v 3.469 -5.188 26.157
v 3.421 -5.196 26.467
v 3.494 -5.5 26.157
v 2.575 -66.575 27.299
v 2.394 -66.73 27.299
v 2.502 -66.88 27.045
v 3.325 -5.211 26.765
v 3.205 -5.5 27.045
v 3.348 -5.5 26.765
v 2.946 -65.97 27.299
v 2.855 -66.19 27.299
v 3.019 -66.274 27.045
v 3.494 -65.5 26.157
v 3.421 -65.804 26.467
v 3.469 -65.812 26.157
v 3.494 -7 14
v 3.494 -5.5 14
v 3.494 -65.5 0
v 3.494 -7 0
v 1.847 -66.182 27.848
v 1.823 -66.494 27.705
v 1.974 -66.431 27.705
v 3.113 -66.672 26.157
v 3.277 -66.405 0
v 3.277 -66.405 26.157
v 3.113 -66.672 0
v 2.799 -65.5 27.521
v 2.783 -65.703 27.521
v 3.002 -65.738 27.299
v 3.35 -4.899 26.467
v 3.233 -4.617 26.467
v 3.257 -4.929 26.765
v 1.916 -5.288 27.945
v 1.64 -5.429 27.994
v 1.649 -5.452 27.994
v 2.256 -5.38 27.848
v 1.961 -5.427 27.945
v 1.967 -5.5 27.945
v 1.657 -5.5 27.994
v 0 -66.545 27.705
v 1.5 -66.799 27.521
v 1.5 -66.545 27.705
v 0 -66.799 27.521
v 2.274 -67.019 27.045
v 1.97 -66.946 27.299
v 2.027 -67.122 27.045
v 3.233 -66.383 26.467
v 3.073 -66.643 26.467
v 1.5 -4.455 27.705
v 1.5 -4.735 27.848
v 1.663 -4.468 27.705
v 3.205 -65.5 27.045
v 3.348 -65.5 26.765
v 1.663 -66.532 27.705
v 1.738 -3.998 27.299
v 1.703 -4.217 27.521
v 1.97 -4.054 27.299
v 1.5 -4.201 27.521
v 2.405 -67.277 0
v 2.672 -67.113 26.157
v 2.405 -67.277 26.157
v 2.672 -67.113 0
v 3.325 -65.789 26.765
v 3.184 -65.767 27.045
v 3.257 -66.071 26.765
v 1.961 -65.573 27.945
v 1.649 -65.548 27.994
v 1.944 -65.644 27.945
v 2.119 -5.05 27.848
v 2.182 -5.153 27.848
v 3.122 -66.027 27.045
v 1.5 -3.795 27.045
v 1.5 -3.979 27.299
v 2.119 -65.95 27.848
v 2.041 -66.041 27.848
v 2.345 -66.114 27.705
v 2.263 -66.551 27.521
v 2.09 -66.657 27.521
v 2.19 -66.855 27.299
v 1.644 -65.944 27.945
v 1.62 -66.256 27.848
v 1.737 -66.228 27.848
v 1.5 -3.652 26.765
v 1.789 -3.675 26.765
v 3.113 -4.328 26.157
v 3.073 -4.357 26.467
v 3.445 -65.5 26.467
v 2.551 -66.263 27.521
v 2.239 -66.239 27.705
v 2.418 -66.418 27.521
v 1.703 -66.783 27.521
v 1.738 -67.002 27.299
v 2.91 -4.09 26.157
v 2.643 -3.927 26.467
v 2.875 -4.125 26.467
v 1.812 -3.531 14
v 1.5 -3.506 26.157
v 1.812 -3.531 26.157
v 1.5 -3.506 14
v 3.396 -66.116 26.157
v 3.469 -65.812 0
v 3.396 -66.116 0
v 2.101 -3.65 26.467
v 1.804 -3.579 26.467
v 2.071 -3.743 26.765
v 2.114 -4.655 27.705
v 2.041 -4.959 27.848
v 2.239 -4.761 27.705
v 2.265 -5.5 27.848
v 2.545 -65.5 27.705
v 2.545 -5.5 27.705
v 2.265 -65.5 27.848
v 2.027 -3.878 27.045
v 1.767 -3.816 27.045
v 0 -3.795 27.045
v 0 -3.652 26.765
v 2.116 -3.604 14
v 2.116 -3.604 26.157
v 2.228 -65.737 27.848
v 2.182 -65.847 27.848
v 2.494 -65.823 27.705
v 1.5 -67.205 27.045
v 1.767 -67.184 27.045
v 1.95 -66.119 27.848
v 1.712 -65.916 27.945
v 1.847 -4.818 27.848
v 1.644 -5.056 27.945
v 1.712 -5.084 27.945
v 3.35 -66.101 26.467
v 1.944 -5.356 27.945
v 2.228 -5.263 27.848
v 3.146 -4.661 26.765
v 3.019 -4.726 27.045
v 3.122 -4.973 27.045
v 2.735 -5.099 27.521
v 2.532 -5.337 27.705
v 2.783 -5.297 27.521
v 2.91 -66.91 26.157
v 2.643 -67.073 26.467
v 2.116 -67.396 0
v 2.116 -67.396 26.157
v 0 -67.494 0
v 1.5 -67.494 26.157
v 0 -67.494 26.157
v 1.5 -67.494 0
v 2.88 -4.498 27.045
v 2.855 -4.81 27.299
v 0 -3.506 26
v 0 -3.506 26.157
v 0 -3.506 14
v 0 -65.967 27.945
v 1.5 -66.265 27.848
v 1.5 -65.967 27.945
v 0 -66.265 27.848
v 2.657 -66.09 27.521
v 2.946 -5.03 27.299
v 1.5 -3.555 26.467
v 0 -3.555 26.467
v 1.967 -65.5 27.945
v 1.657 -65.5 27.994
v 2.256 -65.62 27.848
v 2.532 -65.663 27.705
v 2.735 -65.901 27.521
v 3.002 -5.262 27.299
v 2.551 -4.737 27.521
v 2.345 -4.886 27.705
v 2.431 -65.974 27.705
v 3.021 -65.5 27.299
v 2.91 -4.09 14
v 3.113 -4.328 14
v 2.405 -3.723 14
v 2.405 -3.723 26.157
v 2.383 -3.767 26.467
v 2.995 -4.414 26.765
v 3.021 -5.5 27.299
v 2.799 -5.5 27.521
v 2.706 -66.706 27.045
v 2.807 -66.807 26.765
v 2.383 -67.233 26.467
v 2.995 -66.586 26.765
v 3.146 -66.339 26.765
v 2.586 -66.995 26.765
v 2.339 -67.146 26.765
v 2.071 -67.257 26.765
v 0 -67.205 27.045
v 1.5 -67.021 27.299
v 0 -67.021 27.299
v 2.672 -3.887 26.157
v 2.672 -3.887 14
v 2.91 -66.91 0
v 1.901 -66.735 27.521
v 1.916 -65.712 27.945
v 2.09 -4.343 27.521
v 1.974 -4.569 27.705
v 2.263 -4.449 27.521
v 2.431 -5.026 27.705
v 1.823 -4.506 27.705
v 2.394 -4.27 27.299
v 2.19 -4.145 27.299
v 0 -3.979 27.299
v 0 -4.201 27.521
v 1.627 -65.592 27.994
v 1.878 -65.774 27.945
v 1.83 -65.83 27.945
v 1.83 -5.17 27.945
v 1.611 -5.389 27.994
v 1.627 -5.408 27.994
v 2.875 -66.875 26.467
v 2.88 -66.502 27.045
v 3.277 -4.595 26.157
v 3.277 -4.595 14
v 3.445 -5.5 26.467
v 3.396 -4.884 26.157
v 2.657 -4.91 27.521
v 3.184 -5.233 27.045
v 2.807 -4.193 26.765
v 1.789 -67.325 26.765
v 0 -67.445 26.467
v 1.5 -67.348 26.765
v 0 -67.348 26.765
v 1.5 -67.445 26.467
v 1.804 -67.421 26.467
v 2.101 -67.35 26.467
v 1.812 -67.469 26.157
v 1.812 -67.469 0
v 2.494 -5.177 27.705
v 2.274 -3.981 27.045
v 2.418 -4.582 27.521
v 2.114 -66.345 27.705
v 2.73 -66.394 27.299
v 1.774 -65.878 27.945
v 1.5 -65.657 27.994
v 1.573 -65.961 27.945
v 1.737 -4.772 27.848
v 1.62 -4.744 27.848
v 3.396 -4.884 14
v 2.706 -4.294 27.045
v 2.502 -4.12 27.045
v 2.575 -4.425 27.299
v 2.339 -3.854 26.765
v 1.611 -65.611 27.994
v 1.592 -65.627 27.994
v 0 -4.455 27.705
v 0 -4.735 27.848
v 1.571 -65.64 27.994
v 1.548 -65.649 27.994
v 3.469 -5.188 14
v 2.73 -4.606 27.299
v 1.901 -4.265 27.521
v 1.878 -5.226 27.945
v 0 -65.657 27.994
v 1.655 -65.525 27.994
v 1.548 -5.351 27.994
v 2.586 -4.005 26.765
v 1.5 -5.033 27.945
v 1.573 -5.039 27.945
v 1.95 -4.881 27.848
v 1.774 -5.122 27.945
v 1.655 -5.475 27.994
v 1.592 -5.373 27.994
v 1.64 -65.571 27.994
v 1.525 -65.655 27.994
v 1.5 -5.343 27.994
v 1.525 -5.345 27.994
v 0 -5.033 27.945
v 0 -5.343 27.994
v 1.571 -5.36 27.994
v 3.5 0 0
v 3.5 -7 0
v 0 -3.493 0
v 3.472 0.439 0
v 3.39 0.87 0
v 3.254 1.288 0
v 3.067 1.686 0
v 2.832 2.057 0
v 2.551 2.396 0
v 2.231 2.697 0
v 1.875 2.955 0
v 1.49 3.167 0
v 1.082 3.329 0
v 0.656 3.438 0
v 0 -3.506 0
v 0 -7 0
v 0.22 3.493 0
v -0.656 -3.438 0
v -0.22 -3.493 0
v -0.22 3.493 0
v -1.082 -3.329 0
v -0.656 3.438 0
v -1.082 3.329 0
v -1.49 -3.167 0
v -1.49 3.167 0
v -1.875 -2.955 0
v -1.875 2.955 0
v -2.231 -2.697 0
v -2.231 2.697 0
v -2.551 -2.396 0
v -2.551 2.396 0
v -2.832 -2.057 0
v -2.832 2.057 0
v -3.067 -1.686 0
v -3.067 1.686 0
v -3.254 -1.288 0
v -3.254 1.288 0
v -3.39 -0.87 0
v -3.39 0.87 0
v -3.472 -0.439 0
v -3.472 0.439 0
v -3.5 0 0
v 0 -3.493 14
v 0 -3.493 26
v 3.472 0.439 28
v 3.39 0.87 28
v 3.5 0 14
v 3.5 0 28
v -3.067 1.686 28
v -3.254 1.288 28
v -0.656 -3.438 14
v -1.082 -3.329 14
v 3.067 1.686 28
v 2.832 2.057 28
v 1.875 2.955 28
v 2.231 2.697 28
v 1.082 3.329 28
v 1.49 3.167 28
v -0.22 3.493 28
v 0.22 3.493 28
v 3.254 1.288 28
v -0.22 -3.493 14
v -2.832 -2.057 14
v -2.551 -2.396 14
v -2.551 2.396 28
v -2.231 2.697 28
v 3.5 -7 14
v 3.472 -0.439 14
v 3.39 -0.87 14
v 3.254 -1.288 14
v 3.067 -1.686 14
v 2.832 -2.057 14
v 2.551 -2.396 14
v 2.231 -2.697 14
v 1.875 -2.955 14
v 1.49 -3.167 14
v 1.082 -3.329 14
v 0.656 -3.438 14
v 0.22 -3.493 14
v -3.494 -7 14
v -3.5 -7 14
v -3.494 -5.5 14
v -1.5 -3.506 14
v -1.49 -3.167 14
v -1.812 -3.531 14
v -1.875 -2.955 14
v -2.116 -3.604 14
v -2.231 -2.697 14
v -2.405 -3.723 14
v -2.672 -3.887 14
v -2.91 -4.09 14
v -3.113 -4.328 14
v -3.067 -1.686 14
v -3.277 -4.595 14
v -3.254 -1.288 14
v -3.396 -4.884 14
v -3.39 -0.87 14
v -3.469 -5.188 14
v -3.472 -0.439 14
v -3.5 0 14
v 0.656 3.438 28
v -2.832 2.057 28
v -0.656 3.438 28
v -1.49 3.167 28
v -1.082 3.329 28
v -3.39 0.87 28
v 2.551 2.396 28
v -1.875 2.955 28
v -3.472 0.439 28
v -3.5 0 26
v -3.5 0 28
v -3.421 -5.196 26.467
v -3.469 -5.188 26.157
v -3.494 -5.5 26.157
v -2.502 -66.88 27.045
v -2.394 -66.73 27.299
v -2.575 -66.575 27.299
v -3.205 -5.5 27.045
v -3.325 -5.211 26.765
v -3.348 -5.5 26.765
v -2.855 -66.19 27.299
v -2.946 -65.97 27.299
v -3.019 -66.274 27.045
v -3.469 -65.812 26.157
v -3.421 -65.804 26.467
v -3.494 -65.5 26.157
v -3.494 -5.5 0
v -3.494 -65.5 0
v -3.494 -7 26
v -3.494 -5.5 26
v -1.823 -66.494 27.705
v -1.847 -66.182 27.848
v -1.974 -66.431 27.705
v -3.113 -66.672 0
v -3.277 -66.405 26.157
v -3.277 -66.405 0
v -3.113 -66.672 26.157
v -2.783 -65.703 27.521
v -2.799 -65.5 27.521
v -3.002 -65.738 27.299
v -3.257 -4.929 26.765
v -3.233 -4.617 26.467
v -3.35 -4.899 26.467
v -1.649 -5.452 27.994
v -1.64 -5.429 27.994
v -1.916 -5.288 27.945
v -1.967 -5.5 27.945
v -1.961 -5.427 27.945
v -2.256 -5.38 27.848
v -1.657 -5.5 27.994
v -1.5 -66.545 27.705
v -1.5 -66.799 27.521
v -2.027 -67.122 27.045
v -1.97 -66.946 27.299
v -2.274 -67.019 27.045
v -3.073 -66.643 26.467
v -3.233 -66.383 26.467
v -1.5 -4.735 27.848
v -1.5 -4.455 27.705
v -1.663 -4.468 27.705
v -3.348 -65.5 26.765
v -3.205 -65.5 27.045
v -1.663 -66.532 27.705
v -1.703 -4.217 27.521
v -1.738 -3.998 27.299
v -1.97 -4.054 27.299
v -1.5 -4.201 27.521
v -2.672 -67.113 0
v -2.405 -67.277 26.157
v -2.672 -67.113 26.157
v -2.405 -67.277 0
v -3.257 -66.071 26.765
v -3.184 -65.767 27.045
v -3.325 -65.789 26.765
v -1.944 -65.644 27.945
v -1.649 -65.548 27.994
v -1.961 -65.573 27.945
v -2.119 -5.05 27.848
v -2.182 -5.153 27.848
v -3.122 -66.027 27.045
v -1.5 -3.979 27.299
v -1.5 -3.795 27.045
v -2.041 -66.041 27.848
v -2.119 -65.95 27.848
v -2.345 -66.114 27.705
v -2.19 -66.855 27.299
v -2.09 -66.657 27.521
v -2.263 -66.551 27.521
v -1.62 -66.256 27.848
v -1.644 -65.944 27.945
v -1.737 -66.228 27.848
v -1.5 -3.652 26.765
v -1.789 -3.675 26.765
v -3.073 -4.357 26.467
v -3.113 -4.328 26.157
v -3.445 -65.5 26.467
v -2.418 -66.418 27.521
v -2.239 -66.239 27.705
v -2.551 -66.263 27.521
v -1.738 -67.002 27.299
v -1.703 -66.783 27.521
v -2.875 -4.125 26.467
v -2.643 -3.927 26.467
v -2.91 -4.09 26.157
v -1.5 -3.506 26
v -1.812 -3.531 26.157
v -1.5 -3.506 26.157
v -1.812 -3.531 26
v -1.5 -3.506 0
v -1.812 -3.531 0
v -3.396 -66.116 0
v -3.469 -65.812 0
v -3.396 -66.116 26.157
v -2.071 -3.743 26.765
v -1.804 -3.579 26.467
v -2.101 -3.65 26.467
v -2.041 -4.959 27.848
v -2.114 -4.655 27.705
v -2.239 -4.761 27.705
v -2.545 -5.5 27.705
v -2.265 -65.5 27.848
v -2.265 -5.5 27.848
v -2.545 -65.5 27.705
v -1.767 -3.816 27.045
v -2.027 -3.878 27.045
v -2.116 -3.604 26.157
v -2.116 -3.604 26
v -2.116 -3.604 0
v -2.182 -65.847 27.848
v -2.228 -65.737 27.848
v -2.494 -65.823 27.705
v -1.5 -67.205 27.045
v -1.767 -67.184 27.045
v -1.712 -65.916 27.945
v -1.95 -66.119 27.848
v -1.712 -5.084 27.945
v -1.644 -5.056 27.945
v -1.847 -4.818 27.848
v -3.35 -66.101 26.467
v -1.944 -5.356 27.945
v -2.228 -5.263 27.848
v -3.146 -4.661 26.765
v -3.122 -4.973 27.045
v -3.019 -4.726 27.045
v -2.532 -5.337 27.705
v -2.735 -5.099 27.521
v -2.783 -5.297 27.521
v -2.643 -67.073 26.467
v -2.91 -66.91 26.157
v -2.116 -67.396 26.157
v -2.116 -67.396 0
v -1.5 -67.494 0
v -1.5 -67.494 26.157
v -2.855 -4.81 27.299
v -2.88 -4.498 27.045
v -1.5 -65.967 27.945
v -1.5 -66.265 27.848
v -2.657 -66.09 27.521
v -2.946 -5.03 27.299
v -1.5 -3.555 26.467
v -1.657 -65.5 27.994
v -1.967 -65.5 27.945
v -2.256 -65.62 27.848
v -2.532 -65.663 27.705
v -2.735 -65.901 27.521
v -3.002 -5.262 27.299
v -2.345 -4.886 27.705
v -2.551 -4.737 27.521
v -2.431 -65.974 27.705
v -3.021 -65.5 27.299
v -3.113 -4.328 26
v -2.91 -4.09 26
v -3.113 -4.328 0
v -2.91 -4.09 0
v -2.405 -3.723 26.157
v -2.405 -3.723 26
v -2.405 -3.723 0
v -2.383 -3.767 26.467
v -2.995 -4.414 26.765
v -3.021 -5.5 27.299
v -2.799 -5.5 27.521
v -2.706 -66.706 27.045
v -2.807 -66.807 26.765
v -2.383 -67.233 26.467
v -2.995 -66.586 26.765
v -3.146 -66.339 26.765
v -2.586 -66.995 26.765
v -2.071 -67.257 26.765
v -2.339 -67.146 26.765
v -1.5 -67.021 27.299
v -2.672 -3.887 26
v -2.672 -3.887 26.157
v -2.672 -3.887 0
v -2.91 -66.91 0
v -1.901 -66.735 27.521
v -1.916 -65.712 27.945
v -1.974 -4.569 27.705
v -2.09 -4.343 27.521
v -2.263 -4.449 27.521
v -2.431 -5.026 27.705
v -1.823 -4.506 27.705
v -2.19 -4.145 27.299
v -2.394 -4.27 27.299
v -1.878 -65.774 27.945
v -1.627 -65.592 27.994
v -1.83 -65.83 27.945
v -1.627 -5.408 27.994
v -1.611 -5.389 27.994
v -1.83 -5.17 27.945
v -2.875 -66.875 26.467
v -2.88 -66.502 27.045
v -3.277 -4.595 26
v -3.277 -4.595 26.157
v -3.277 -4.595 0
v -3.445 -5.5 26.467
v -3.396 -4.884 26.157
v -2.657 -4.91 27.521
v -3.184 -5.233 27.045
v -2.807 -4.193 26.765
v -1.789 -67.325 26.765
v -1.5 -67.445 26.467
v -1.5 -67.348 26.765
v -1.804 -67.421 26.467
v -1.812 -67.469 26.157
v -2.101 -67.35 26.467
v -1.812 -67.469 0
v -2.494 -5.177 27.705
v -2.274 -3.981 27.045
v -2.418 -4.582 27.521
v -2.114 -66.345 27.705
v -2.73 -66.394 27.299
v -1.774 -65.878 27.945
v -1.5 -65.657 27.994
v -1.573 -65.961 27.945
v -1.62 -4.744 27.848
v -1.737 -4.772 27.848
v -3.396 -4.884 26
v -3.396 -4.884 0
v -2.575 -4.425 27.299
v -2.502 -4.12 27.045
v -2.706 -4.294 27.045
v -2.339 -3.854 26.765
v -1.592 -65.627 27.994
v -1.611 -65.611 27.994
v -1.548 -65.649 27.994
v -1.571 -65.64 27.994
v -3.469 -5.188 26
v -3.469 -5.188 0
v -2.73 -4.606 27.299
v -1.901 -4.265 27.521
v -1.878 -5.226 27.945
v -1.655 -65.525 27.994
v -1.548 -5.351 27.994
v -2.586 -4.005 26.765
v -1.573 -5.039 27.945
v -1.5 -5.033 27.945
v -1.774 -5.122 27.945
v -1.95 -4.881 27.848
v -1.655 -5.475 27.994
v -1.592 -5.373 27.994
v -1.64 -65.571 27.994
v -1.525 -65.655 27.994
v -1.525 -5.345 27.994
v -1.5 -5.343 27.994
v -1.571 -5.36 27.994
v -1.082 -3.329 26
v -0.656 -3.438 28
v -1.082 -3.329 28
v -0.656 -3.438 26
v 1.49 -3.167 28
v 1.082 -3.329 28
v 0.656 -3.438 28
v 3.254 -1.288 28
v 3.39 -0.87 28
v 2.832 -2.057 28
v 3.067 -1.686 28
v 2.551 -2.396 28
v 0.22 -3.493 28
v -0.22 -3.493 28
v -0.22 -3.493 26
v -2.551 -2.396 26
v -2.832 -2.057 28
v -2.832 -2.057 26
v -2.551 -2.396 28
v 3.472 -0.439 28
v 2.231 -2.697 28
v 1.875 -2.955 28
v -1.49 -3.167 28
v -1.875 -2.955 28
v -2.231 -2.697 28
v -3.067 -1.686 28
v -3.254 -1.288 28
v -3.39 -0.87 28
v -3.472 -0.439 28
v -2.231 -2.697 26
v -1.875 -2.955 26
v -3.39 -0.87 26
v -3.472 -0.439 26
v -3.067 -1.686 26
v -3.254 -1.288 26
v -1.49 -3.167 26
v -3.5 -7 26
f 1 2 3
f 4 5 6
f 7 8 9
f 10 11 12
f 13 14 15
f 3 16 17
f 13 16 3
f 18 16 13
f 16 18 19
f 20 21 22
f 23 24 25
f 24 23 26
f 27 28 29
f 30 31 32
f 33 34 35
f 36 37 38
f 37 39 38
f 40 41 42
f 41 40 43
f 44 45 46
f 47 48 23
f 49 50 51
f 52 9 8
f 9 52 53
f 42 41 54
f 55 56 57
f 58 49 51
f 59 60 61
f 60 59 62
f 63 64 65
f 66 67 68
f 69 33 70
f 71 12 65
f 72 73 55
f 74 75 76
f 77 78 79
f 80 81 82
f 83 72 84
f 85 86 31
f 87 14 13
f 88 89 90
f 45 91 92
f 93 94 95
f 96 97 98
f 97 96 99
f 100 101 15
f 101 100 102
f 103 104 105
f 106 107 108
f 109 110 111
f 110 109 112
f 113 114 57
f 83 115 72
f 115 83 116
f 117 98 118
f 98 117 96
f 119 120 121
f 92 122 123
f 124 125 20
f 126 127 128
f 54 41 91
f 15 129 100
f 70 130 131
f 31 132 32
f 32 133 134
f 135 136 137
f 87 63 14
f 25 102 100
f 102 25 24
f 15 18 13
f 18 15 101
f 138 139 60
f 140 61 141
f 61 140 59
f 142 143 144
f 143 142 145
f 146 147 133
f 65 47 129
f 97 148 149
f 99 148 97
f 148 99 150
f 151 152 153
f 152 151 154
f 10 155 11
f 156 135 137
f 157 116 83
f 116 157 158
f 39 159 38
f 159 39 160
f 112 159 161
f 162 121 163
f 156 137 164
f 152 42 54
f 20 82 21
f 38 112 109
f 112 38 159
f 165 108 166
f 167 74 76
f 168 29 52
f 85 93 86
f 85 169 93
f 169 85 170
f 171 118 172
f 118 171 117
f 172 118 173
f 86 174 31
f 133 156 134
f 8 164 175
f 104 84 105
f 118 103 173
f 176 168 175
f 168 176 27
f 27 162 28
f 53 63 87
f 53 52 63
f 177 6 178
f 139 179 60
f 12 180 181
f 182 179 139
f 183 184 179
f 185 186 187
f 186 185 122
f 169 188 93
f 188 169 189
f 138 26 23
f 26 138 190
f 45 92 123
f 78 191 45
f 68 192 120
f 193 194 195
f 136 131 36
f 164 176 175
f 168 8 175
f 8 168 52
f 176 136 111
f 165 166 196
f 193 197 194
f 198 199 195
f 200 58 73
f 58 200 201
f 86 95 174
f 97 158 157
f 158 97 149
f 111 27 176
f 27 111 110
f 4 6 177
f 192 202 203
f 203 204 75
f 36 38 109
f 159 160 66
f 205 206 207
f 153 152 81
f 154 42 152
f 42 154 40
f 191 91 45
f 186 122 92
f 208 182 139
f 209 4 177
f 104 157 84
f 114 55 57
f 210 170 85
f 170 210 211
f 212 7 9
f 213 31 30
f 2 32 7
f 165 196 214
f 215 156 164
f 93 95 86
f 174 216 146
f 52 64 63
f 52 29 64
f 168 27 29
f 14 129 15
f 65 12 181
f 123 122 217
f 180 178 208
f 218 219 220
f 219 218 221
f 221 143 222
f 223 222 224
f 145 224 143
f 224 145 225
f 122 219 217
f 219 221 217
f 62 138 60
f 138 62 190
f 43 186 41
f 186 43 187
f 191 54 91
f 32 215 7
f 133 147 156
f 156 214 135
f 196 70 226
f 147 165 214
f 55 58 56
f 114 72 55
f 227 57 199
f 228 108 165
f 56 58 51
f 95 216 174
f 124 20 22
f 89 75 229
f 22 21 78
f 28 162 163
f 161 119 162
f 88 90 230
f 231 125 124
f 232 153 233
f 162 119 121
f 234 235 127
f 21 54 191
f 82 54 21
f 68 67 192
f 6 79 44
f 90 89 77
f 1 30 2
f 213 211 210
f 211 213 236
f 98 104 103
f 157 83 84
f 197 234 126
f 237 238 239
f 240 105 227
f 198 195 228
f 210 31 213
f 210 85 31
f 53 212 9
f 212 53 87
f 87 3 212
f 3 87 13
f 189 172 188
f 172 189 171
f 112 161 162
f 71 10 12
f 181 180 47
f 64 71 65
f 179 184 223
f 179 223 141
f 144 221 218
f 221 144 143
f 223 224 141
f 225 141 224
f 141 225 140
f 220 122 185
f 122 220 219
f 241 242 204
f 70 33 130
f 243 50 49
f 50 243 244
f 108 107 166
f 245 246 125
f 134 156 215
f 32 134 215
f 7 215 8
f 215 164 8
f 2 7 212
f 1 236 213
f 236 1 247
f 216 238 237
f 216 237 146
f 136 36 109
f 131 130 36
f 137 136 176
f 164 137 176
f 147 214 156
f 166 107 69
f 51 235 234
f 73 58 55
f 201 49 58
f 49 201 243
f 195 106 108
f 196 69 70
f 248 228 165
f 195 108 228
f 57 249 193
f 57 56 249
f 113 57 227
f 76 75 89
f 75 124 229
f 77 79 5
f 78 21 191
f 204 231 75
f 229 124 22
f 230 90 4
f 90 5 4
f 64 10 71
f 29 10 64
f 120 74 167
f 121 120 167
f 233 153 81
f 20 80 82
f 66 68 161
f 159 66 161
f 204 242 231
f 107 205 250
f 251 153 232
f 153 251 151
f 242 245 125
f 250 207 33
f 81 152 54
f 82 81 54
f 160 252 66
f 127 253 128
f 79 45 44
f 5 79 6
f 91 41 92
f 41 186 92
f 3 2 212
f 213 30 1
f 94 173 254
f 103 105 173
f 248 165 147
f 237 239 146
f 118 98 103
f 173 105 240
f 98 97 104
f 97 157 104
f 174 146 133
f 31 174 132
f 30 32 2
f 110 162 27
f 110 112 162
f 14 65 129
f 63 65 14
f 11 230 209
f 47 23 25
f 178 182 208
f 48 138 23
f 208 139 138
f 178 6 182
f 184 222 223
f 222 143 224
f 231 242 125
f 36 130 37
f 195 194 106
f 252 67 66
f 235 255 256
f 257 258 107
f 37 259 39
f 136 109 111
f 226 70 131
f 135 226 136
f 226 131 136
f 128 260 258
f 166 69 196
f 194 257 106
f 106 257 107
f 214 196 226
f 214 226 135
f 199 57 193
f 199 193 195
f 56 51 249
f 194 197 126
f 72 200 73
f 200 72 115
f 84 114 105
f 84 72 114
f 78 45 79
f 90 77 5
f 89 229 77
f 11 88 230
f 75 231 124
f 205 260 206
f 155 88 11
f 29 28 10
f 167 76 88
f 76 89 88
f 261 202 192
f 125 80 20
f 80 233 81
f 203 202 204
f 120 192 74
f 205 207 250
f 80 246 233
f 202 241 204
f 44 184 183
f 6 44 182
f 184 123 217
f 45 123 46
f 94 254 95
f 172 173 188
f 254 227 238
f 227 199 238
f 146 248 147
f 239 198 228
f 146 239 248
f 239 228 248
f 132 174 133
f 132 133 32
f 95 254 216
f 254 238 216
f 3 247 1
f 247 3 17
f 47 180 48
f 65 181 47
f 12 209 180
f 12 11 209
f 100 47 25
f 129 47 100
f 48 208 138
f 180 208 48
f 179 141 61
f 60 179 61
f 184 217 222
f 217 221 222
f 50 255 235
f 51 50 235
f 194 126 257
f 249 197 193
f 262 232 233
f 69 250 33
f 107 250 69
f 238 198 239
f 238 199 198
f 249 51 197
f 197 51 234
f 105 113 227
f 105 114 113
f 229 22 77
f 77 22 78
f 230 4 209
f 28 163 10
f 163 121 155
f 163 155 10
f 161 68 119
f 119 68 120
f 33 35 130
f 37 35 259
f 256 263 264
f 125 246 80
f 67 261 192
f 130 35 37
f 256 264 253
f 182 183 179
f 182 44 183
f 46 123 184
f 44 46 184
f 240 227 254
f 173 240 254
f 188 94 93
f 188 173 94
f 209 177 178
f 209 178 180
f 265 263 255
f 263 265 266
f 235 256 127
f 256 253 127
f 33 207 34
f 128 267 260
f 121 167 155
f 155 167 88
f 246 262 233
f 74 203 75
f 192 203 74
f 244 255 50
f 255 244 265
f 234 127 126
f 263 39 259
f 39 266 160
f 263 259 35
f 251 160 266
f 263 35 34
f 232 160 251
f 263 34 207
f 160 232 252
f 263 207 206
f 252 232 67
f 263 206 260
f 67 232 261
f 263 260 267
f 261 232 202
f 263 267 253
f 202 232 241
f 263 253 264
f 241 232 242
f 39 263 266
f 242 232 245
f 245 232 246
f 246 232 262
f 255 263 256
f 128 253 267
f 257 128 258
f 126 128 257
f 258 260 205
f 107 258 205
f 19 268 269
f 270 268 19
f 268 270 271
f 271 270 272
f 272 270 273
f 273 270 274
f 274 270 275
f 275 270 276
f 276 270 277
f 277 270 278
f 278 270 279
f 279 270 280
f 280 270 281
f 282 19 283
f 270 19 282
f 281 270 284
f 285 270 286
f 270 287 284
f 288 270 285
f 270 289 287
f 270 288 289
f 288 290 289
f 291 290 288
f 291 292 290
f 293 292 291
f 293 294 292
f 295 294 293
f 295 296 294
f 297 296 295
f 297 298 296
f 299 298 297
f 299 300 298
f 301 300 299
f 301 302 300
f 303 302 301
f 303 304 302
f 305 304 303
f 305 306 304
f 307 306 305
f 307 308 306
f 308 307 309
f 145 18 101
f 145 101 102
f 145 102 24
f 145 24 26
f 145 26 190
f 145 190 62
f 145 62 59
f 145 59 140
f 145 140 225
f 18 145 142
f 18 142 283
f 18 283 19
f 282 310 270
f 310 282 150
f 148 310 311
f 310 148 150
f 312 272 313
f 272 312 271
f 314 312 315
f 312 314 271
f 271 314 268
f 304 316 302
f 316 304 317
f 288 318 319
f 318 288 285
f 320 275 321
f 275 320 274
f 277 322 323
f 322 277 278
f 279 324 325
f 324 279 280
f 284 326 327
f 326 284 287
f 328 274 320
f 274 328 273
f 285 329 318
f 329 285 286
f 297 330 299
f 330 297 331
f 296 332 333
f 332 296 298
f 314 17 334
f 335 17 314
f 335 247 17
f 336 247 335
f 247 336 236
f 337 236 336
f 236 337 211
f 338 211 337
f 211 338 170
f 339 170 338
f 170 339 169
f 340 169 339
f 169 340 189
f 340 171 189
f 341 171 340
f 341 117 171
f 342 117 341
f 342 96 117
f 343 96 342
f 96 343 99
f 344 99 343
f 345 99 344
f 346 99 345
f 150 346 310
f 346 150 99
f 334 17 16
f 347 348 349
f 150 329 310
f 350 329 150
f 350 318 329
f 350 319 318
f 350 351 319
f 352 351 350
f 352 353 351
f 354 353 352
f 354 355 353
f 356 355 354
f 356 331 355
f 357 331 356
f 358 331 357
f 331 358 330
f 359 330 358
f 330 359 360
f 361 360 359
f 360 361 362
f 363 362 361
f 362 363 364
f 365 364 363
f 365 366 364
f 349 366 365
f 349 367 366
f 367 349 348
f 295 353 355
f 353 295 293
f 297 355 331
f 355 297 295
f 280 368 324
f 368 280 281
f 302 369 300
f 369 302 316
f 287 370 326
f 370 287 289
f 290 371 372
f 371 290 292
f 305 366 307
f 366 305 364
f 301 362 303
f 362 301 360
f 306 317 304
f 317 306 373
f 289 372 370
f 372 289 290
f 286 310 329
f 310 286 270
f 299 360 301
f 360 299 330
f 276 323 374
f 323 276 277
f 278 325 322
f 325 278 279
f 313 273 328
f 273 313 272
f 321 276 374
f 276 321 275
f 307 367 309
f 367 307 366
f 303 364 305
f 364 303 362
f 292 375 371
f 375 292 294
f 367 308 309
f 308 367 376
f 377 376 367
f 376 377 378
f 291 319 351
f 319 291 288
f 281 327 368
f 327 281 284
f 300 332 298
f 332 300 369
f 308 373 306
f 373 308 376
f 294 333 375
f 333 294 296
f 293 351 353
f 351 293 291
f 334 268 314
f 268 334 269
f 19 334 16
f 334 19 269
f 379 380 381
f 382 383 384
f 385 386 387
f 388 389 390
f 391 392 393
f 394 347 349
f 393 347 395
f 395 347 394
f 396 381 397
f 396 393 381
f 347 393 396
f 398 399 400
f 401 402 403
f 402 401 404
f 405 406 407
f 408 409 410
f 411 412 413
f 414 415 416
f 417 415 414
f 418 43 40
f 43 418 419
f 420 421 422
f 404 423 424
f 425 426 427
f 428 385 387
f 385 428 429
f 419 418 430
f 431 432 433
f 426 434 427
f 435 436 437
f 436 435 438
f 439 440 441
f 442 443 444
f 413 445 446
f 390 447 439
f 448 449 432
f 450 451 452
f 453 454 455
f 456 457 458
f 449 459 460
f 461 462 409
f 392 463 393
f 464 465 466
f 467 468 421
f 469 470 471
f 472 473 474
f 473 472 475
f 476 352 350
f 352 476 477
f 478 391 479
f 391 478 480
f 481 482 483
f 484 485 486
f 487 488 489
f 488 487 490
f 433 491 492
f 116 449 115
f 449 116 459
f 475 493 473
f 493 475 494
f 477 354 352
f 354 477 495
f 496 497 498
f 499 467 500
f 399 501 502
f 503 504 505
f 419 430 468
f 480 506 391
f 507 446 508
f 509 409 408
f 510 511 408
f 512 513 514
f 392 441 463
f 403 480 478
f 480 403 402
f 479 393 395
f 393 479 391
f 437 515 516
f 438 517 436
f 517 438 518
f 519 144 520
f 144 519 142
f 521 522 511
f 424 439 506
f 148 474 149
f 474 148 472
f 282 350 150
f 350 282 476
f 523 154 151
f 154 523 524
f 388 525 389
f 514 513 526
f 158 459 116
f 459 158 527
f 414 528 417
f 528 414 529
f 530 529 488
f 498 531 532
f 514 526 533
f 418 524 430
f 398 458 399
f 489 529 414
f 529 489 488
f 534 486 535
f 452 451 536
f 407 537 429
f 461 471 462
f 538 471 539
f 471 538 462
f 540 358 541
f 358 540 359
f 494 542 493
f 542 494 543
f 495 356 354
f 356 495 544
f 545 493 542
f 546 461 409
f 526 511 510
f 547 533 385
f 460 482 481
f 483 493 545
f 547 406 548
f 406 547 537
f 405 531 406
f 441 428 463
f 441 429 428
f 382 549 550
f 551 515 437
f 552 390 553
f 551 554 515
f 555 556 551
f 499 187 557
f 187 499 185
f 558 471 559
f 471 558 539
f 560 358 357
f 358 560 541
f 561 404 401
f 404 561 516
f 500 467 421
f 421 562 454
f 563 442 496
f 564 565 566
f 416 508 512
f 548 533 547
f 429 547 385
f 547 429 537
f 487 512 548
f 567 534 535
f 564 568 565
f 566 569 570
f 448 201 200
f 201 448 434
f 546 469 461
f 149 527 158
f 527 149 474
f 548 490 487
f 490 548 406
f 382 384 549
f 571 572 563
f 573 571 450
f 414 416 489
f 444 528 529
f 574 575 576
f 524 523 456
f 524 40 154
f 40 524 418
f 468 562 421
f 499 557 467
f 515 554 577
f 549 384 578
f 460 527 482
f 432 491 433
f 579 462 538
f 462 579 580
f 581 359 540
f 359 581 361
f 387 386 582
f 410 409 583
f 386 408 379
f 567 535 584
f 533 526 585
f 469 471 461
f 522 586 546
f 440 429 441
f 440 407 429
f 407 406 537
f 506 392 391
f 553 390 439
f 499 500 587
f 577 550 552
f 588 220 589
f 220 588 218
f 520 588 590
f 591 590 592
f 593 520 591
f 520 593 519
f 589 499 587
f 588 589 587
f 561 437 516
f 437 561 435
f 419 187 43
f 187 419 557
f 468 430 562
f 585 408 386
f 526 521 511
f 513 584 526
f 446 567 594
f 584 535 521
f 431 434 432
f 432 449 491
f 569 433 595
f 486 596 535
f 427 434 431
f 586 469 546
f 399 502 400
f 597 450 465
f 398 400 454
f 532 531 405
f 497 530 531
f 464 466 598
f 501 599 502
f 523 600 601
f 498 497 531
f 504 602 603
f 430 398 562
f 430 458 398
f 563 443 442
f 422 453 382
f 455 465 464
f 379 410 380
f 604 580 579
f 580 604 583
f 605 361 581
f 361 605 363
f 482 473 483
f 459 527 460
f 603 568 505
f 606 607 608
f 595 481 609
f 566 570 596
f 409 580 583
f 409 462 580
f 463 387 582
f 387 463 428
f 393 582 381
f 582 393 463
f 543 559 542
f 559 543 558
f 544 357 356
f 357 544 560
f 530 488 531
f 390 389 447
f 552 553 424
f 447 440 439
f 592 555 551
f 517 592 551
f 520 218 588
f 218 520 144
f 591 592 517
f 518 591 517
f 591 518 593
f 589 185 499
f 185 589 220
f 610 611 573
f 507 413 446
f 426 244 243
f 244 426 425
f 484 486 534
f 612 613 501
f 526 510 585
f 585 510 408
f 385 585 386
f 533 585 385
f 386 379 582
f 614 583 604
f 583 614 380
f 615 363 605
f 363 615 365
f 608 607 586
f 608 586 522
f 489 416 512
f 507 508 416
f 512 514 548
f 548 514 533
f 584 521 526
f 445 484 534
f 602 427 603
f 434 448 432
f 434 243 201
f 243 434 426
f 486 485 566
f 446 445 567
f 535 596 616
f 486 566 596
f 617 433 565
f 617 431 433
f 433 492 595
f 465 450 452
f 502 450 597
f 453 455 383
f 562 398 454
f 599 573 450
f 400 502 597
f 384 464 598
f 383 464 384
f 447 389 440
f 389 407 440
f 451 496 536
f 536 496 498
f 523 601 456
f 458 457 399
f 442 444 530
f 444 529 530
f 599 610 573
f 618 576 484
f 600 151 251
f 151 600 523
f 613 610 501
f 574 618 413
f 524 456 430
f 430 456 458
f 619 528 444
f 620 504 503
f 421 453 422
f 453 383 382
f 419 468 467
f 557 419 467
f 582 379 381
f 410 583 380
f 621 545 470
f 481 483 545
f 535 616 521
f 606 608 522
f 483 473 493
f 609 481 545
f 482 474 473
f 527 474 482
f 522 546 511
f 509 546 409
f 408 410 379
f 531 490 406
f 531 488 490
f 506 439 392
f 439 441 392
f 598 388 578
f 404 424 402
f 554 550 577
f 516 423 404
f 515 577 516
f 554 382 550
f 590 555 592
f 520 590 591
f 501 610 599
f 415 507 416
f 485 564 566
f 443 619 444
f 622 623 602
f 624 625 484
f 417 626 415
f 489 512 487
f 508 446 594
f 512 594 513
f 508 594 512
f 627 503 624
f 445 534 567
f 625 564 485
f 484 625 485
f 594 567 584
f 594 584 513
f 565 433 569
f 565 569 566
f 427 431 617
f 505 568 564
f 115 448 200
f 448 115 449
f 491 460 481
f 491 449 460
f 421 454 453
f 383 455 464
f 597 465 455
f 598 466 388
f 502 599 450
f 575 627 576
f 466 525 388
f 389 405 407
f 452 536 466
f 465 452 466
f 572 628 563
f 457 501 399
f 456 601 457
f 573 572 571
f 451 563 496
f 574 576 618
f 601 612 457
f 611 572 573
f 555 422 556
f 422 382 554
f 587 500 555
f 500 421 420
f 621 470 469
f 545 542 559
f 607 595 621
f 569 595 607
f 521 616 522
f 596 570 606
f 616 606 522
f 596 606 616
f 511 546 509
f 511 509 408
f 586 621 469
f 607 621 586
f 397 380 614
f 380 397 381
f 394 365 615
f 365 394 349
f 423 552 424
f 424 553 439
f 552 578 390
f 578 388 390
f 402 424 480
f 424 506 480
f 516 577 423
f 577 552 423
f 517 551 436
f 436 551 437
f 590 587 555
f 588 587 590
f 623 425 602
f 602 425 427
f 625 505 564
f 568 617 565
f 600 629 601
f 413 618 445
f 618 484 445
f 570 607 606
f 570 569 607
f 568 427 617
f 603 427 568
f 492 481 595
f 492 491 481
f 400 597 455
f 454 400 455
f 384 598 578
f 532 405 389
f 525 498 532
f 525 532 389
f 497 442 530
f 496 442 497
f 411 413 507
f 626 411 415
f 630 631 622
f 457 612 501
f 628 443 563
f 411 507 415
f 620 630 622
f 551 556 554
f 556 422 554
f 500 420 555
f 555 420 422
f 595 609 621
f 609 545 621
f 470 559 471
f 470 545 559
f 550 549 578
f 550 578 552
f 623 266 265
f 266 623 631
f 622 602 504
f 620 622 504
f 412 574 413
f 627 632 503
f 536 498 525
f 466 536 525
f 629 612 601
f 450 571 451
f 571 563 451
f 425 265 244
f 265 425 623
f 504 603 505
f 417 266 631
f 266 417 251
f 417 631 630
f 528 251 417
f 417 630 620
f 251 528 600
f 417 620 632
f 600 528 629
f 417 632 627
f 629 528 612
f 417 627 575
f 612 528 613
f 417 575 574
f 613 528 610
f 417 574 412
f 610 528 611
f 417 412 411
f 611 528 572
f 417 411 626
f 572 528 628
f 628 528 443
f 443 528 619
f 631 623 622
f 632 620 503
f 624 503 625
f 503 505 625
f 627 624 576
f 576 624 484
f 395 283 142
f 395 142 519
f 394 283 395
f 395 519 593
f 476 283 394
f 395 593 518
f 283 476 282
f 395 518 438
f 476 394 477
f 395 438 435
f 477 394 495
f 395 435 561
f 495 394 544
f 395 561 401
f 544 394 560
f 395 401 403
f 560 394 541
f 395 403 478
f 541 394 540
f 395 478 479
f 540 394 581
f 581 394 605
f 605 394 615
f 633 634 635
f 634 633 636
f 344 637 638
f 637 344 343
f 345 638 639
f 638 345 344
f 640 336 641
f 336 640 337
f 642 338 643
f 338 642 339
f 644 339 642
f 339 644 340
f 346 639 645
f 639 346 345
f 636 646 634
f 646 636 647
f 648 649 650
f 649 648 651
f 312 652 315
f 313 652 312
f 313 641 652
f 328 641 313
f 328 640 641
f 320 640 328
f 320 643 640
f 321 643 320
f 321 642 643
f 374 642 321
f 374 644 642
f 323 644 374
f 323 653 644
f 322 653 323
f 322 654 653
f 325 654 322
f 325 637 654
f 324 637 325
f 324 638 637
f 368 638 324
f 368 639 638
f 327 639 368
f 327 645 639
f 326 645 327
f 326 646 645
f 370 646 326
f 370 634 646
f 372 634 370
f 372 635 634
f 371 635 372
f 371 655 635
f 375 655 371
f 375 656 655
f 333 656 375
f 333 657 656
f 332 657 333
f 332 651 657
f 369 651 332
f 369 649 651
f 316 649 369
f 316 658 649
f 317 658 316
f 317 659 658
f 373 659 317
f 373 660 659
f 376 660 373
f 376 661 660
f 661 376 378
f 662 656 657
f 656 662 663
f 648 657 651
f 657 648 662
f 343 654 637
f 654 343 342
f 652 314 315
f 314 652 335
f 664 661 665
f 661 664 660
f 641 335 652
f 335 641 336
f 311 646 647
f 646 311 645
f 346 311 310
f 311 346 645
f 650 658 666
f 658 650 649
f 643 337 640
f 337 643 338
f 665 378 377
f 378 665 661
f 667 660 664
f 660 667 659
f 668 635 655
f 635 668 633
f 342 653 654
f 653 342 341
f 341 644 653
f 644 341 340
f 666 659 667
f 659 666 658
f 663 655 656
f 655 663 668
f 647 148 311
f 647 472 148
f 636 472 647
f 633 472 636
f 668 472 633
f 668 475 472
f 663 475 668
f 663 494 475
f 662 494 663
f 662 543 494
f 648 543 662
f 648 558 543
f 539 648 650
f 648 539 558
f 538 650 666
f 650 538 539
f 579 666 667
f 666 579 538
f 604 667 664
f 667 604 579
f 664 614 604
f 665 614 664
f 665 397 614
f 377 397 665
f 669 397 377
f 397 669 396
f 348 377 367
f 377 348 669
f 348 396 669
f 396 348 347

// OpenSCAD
// file: ../utils/m3.scad
headRadius = 5.2 / 2;
screewRadius = 2.8 / 2;
faces = 50;



module m3Tight (height = 10, headHeight = 3) {
    color("#5f7f5f") {
        cylinder(h = height, r = screewRadius - 0.1, $fn=faces);
        
        translate(v = [0,0,height]) 
        cylinder(h = headHeight, r = headRadius, $fn=faces);
    }
}


module m3Loose (height = 10, headHeight = 3) {
    color("#8c5353") {
        cylinder(h = height, r = screewRadius, $fn=faces);
        
        translate(v = [0,0,height]) 
        cylinder(h = headHeight, r = headRadius + 0.1, $fn=faces);
    }
}

m3Tight();

translate(v = [8,0,0]) 
m3Loose();
// main file
use <../utils/m3.scad>;

faces=50;
sideThickness = 3.5;
maxHeight = 28;
roundRadius = 2;


// m3Tight(height=25, headHeight=4);

module sidePanel () {
    panelLength = 60;

    module roundedPanel () {
        translate([0,-panelLength,0]) {
            minkowski() {
                cube([
                    sideThickness - roundRadius,
                    panelLength,
                    maxHeight - roundRadius
                ]);
                sphere(r = roundRadius, $fn=40);
            }
        }
    }

    module bottomCutout () {
        translate(v = [
            -sideThickness,-panelLength-5,-roundRadius
        ]) 
        cube([
            sideThickness * 2,
            panelLength + 10,
            roundRadius
        ]);
    }

    module sideCutout () {
        translate(v = [
            -sideThickness,
            -panelLength * 1.5,
            -roundRadius
        ]) 
        cube([
            sideThickness,
            panelLength * 2,
            maxHeight + roundRadius
        ]);
    }


    translate(v = [0,-sideThickness-roundRadius,0]){
        difference() {
            roundedPanel();
            bottomCutout();
            sideCutout();
        }
    } 
}


module rightSide () {
    color("#8585f5") {
        cylinder(h=(maxHeight / 2), r=sideThickness, $fn=faces);
        translate(v = [0,-7,0]) {
            cube(size = [sideThickness,7,(maxHeight / 2)]);
        } 
        sidePanel();
    }
}

module leftSide () {
    color("#e91e63") {
        translate(v = [0,0,maxHeight / 2]) {
            cylinder(h=(maxHeight / 2), r=sideThickness, $fn=faces);
        } 
        translate(v = [-sideThickness,-7,maxHeight / 2]) {
            cube(size = [sideThickness,7,(maxHeight / 2)-roundRadius]);
        } 
        mirror(v=[1,0,0]) {
            sidePanel();
        }
    }
}

rightSide();
leftSide();
